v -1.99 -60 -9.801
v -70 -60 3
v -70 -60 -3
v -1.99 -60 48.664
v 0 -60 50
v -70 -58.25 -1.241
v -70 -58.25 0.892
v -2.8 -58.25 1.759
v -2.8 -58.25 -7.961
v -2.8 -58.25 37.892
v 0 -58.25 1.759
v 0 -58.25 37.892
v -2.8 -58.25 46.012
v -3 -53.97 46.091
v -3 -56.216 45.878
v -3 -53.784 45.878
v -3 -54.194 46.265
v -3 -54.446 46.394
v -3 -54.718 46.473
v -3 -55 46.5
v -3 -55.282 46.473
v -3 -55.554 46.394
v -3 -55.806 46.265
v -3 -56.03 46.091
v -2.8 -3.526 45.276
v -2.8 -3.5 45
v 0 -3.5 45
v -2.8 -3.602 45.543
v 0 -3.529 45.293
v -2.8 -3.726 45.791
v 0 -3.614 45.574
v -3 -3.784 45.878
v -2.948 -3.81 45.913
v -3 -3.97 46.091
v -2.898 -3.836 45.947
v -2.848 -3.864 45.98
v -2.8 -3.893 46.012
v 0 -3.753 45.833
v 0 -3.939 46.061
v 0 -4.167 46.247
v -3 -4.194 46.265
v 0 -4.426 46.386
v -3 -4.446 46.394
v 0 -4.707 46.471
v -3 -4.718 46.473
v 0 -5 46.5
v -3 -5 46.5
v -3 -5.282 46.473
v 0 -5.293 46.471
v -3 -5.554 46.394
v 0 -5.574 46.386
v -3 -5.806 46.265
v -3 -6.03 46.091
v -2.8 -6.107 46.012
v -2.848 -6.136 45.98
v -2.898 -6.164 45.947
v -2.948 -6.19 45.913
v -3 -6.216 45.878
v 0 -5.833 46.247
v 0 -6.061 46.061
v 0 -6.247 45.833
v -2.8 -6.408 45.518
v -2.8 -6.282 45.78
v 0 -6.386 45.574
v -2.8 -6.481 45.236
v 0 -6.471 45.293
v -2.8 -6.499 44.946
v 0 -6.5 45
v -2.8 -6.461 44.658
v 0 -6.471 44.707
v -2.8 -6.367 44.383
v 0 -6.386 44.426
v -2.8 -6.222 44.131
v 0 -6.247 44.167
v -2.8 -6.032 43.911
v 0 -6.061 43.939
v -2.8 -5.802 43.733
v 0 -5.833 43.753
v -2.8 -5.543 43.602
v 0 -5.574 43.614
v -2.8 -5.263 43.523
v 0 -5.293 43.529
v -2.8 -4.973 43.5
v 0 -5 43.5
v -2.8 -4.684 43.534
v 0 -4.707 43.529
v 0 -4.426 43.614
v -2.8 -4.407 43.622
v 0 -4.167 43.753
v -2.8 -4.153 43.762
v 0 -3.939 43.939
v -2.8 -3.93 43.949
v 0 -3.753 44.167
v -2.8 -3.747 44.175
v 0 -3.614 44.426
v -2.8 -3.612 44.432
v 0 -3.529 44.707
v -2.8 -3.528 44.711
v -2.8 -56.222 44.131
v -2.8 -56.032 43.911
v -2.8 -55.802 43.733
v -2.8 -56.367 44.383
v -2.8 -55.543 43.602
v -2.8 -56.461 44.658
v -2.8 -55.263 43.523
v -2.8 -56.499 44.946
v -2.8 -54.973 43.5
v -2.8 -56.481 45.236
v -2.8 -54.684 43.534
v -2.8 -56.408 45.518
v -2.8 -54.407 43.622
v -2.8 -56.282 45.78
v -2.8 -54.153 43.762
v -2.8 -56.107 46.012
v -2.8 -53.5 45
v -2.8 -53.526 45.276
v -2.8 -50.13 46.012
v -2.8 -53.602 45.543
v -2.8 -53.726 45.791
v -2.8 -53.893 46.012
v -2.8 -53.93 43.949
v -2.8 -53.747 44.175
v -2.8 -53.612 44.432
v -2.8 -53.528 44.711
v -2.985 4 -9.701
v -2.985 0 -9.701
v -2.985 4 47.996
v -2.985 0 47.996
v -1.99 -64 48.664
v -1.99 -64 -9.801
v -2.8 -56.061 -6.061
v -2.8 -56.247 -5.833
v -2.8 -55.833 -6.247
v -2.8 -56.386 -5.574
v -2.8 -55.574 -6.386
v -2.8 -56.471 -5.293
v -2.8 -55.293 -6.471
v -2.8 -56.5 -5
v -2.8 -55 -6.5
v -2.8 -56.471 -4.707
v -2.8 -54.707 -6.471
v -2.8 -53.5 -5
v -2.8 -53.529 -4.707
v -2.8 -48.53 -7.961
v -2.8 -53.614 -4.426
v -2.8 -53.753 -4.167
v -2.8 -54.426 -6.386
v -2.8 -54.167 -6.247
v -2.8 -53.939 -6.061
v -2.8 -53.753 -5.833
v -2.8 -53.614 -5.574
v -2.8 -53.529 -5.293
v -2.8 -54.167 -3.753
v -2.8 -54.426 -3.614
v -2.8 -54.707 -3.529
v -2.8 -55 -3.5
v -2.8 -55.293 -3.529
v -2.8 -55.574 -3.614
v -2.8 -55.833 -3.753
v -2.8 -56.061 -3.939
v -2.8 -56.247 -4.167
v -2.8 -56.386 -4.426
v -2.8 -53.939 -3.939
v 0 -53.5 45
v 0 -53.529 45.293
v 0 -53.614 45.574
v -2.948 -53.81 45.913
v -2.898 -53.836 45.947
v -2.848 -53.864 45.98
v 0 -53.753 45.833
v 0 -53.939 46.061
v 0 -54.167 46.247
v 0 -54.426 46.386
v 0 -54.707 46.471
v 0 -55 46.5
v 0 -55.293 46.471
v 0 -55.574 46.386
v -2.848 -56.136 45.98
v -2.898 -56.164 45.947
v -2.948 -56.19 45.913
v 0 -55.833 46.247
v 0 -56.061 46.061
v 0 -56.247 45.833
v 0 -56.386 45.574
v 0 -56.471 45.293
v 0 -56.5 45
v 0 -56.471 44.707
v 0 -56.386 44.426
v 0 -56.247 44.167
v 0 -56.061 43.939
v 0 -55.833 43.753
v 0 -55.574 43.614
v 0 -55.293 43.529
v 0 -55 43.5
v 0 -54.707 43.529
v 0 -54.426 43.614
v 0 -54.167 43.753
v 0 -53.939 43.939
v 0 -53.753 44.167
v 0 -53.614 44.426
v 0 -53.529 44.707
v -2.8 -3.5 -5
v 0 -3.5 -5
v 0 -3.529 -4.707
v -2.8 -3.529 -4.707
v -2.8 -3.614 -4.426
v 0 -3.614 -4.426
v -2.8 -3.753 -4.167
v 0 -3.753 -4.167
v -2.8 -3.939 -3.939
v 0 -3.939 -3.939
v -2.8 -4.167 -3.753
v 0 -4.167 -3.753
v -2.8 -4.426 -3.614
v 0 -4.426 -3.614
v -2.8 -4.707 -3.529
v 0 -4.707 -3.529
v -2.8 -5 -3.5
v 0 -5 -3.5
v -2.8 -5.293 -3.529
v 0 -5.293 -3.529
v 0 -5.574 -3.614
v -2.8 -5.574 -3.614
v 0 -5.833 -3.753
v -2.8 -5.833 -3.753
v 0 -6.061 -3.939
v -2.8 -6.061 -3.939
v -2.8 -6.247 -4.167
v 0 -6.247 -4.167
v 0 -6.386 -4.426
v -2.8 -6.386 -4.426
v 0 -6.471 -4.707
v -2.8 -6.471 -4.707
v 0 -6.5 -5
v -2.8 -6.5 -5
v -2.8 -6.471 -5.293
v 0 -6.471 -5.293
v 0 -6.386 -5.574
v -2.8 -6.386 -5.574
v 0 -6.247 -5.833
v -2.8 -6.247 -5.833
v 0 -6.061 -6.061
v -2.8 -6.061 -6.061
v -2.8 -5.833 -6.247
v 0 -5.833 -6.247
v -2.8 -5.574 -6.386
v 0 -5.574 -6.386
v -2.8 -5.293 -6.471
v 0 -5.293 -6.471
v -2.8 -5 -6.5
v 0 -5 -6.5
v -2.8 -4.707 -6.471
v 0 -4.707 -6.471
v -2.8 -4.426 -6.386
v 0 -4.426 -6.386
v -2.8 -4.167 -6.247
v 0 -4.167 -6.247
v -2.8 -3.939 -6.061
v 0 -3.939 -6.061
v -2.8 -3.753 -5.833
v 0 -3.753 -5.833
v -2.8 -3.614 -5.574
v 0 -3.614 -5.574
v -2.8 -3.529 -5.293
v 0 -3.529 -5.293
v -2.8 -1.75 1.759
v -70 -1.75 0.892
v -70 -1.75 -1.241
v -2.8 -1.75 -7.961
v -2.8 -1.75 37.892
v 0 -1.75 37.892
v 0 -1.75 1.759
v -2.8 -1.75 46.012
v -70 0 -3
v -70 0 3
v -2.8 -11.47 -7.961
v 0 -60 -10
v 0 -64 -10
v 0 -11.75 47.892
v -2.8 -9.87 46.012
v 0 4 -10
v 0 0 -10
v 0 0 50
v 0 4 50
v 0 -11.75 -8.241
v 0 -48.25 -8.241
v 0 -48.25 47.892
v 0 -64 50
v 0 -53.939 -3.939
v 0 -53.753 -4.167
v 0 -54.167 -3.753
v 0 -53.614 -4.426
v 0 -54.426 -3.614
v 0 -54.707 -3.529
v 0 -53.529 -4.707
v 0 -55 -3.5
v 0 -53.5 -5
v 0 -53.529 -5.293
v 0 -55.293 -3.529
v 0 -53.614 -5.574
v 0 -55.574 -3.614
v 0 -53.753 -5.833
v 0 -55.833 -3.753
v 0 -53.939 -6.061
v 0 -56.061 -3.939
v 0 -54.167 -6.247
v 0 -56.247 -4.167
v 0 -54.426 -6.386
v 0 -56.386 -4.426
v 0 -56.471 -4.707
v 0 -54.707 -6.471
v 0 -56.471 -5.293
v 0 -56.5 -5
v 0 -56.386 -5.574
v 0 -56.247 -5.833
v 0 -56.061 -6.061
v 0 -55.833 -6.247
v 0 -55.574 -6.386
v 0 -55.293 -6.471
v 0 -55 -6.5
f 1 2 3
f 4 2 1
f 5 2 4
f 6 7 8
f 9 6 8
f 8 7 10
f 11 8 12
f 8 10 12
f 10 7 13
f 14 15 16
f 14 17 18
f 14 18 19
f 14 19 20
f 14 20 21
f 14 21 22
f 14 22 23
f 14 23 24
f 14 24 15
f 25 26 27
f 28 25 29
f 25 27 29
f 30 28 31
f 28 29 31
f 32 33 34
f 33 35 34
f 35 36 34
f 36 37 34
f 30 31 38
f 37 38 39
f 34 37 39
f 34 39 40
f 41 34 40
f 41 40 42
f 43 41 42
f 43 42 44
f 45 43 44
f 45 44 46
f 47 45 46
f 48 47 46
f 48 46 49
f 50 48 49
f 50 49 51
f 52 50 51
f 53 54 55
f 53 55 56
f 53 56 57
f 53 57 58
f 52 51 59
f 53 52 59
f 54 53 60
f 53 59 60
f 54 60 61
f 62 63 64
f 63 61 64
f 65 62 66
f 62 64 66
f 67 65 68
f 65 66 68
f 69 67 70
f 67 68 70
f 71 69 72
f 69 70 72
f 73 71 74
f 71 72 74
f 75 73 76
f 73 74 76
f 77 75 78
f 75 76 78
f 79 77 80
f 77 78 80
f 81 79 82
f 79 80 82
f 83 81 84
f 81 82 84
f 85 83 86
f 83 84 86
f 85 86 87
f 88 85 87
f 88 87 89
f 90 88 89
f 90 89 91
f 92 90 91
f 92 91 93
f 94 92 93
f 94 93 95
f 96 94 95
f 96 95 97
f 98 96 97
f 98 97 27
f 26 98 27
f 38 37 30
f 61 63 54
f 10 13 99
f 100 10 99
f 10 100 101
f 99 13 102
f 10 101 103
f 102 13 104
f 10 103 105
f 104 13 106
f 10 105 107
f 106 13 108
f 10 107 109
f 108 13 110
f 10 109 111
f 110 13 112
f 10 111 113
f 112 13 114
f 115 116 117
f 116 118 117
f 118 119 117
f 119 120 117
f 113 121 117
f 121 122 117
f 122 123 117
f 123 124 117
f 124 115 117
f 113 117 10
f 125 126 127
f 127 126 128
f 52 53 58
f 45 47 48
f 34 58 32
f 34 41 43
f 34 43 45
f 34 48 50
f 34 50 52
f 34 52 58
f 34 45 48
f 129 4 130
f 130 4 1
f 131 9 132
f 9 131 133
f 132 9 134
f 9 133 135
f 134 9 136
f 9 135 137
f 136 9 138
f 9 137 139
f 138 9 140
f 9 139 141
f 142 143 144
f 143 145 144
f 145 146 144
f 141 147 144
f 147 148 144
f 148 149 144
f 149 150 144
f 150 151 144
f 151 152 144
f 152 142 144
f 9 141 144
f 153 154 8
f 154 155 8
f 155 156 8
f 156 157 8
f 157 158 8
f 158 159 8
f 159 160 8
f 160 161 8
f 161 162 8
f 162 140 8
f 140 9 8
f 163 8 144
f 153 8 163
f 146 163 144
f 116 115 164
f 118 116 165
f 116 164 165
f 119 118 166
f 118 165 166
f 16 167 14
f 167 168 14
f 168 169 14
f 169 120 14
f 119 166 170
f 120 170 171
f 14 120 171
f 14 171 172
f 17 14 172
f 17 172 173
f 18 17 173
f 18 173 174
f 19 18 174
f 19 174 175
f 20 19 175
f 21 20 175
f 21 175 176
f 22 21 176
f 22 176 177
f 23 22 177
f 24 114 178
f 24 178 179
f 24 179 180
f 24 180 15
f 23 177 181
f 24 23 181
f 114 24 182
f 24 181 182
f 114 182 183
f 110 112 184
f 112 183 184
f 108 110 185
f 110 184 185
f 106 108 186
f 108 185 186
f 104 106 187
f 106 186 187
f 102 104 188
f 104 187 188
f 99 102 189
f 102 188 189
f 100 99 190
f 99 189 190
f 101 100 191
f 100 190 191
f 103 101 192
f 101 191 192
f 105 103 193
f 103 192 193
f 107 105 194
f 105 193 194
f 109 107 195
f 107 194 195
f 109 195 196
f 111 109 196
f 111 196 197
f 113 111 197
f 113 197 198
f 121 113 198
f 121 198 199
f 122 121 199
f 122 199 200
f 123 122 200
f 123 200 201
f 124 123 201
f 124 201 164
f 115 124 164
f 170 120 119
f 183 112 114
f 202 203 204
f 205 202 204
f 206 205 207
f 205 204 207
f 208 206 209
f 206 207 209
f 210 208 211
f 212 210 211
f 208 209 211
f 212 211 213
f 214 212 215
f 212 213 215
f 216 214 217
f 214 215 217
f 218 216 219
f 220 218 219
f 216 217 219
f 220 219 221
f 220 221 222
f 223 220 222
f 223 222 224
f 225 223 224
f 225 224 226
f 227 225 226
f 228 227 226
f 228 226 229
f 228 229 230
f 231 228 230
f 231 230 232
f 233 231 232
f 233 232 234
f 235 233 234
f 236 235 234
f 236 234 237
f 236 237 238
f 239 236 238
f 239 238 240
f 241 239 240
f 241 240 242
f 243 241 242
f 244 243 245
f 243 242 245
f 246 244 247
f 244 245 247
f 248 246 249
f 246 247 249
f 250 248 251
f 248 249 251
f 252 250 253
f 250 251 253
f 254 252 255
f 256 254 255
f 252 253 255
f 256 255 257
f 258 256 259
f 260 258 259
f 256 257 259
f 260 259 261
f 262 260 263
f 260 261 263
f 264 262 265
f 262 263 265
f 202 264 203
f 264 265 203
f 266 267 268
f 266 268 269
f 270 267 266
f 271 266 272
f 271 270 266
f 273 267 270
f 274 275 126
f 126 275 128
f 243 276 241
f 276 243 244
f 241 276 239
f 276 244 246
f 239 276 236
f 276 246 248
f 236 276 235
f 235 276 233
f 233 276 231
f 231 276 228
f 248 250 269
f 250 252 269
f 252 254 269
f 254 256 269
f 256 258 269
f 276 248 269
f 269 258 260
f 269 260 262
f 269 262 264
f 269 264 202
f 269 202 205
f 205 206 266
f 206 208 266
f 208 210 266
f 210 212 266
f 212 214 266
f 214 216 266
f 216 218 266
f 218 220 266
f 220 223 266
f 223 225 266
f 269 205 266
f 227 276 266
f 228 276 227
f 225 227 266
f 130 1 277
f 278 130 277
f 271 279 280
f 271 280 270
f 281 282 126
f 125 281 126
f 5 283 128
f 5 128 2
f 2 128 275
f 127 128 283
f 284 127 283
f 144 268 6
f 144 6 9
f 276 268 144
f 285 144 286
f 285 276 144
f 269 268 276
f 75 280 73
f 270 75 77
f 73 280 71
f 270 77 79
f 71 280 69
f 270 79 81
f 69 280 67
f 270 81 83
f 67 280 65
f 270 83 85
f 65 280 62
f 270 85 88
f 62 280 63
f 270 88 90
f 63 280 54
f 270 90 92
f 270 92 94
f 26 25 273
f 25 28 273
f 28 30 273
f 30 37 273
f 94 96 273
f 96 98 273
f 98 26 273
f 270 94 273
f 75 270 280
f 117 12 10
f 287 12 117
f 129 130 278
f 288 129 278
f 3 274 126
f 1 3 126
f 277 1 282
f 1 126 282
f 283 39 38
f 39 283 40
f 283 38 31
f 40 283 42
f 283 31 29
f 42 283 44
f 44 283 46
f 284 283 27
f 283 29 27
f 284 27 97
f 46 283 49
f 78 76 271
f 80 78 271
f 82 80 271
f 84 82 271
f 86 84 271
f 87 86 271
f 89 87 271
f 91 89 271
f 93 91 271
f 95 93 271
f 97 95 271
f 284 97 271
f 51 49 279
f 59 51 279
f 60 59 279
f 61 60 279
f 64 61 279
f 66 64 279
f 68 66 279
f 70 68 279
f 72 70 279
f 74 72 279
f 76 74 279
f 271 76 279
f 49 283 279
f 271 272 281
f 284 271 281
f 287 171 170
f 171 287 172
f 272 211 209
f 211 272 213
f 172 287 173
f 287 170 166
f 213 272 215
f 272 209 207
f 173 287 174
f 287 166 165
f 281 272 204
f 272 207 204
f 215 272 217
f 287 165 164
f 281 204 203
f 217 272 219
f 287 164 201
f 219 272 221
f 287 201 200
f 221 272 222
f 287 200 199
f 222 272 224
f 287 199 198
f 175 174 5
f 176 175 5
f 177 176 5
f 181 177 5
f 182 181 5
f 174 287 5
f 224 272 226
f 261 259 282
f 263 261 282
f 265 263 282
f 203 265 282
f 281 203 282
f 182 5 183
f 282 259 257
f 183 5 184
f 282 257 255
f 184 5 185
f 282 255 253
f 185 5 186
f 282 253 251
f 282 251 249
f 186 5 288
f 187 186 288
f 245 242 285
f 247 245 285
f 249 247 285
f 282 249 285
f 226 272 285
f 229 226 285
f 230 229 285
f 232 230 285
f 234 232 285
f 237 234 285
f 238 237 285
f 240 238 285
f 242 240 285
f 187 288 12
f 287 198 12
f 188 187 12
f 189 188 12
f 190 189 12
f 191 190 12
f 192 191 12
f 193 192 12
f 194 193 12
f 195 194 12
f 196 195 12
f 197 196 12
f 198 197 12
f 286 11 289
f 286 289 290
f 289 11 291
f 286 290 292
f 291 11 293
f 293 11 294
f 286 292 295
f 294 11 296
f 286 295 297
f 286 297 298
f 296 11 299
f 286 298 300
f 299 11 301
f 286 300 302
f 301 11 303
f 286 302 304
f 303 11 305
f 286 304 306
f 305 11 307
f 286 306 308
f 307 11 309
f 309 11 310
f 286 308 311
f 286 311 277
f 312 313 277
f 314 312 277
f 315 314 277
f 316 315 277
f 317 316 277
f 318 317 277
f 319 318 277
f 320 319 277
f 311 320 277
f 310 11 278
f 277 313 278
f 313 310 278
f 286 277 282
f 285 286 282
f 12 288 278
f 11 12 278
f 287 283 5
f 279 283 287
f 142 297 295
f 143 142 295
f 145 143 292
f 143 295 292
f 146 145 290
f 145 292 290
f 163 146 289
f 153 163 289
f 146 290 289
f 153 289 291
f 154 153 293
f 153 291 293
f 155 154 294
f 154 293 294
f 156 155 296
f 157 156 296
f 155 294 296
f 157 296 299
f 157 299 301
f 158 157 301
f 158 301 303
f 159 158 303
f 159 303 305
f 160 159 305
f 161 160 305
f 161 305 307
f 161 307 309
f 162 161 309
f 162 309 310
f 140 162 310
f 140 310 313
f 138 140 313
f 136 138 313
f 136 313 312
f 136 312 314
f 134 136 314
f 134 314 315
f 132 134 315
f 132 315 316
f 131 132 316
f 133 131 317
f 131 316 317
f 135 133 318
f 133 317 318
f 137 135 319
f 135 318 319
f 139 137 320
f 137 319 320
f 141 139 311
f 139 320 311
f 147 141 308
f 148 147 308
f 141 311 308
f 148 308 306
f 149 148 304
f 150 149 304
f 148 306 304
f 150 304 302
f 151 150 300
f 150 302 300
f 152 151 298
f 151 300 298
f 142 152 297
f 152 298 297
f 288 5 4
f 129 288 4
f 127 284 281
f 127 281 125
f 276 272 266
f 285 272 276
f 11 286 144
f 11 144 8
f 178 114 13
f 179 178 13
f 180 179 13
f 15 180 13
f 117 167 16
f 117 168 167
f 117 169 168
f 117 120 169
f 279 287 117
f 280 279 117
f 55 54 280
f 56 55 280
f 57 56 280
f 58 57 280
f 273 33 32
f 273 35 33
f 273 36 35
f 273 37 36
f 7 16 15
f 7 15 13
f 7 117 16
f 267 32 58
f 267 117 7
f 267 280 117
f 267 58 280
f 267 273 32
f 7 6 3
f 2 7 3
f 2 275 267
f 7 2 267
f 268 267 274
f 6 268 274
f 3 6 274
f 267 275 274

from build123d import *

# Parameters (mm, degrees)
F1_DEPTH  = 60
F2_T      = -1.75
F4_DEPTH  = 2.8
F5_R      = 1.5
F6_DEPTH  = 3
F8_DEPTH  = 4
F10_DEPTH = 4


with BuildPart() as f1:
    # F0 (on Front) → F1 (new body)
    with BuildSketch(Plane.XZ):
        Polygon((0, 50), (-70, 3), (-70, -3), (0, -10), align=None)
    extrude(amount=F1_DEPTH)

    # F2
    f2_openings = [f1.faces().sort_by_distance(p)[0] for p in [
        (0, -30, 20),
        (-70, -30, 0),
    ]]
    offset(amount=F2_T, openings=f2_openings)

    # F3 (on face) → F4 (join)
    with BuildSketch(Plane.YZ):
        Polygon((-58.25, 37.892128), (-48.25, 47.892128), (-58.25, 47.892128), align=None)
        Polygon((-1.75, 47.892128), (-11.75, 47.892128), (-1.75, 37.892128), align=None)
        Polygon((-48.25, -8.241272), (-58.25, 1.758728), (-58.25, -8.241272), align=None)
        Polygon((-1.75, 1.758728), (-11.75, -8.241272), (-1.75, -8.241272), align=None)
    extrude(amount=-F4_DEPTH)

    # F5 (on face) → F6 (cut)
    with BuildSketch(Plane.YZ):
        with Locations((-55, 45)):
            Circle(F5_R)
        with Locations((-5, 45)):
            Circle(F5_R)
        with Locations((-55, -5)):
            Circle(F5_R)
        with Locations((-5, -5)):
            Circle(F5_R)
    extrude(amount=-F6_DEPTH, mode=Mode.SUBTRACT)

    # F7 (on face) → F8 (join)
    with BuildSketch(Plane.XZ.offset(60)):
        Polygon((0, 50), (-1.990074, 48.663807), (-1.990074, -9.800993), (0, -10), align=None)
    extrude(amount=F8_DEPTH)

    # F9 (on face) → F10 (join)
    with BuildSketch(Plane(origin=(0, 0, 0), x_dir=(-1, 0, 0), z_dir=(0, 1, 0))):
        Polygon((2.985112, -9.701489), (2.985112, 47.995711), (0, 50), (0, -10), align=None)
    extrude(amount=F10_DEPTH)


solid = f1.part
